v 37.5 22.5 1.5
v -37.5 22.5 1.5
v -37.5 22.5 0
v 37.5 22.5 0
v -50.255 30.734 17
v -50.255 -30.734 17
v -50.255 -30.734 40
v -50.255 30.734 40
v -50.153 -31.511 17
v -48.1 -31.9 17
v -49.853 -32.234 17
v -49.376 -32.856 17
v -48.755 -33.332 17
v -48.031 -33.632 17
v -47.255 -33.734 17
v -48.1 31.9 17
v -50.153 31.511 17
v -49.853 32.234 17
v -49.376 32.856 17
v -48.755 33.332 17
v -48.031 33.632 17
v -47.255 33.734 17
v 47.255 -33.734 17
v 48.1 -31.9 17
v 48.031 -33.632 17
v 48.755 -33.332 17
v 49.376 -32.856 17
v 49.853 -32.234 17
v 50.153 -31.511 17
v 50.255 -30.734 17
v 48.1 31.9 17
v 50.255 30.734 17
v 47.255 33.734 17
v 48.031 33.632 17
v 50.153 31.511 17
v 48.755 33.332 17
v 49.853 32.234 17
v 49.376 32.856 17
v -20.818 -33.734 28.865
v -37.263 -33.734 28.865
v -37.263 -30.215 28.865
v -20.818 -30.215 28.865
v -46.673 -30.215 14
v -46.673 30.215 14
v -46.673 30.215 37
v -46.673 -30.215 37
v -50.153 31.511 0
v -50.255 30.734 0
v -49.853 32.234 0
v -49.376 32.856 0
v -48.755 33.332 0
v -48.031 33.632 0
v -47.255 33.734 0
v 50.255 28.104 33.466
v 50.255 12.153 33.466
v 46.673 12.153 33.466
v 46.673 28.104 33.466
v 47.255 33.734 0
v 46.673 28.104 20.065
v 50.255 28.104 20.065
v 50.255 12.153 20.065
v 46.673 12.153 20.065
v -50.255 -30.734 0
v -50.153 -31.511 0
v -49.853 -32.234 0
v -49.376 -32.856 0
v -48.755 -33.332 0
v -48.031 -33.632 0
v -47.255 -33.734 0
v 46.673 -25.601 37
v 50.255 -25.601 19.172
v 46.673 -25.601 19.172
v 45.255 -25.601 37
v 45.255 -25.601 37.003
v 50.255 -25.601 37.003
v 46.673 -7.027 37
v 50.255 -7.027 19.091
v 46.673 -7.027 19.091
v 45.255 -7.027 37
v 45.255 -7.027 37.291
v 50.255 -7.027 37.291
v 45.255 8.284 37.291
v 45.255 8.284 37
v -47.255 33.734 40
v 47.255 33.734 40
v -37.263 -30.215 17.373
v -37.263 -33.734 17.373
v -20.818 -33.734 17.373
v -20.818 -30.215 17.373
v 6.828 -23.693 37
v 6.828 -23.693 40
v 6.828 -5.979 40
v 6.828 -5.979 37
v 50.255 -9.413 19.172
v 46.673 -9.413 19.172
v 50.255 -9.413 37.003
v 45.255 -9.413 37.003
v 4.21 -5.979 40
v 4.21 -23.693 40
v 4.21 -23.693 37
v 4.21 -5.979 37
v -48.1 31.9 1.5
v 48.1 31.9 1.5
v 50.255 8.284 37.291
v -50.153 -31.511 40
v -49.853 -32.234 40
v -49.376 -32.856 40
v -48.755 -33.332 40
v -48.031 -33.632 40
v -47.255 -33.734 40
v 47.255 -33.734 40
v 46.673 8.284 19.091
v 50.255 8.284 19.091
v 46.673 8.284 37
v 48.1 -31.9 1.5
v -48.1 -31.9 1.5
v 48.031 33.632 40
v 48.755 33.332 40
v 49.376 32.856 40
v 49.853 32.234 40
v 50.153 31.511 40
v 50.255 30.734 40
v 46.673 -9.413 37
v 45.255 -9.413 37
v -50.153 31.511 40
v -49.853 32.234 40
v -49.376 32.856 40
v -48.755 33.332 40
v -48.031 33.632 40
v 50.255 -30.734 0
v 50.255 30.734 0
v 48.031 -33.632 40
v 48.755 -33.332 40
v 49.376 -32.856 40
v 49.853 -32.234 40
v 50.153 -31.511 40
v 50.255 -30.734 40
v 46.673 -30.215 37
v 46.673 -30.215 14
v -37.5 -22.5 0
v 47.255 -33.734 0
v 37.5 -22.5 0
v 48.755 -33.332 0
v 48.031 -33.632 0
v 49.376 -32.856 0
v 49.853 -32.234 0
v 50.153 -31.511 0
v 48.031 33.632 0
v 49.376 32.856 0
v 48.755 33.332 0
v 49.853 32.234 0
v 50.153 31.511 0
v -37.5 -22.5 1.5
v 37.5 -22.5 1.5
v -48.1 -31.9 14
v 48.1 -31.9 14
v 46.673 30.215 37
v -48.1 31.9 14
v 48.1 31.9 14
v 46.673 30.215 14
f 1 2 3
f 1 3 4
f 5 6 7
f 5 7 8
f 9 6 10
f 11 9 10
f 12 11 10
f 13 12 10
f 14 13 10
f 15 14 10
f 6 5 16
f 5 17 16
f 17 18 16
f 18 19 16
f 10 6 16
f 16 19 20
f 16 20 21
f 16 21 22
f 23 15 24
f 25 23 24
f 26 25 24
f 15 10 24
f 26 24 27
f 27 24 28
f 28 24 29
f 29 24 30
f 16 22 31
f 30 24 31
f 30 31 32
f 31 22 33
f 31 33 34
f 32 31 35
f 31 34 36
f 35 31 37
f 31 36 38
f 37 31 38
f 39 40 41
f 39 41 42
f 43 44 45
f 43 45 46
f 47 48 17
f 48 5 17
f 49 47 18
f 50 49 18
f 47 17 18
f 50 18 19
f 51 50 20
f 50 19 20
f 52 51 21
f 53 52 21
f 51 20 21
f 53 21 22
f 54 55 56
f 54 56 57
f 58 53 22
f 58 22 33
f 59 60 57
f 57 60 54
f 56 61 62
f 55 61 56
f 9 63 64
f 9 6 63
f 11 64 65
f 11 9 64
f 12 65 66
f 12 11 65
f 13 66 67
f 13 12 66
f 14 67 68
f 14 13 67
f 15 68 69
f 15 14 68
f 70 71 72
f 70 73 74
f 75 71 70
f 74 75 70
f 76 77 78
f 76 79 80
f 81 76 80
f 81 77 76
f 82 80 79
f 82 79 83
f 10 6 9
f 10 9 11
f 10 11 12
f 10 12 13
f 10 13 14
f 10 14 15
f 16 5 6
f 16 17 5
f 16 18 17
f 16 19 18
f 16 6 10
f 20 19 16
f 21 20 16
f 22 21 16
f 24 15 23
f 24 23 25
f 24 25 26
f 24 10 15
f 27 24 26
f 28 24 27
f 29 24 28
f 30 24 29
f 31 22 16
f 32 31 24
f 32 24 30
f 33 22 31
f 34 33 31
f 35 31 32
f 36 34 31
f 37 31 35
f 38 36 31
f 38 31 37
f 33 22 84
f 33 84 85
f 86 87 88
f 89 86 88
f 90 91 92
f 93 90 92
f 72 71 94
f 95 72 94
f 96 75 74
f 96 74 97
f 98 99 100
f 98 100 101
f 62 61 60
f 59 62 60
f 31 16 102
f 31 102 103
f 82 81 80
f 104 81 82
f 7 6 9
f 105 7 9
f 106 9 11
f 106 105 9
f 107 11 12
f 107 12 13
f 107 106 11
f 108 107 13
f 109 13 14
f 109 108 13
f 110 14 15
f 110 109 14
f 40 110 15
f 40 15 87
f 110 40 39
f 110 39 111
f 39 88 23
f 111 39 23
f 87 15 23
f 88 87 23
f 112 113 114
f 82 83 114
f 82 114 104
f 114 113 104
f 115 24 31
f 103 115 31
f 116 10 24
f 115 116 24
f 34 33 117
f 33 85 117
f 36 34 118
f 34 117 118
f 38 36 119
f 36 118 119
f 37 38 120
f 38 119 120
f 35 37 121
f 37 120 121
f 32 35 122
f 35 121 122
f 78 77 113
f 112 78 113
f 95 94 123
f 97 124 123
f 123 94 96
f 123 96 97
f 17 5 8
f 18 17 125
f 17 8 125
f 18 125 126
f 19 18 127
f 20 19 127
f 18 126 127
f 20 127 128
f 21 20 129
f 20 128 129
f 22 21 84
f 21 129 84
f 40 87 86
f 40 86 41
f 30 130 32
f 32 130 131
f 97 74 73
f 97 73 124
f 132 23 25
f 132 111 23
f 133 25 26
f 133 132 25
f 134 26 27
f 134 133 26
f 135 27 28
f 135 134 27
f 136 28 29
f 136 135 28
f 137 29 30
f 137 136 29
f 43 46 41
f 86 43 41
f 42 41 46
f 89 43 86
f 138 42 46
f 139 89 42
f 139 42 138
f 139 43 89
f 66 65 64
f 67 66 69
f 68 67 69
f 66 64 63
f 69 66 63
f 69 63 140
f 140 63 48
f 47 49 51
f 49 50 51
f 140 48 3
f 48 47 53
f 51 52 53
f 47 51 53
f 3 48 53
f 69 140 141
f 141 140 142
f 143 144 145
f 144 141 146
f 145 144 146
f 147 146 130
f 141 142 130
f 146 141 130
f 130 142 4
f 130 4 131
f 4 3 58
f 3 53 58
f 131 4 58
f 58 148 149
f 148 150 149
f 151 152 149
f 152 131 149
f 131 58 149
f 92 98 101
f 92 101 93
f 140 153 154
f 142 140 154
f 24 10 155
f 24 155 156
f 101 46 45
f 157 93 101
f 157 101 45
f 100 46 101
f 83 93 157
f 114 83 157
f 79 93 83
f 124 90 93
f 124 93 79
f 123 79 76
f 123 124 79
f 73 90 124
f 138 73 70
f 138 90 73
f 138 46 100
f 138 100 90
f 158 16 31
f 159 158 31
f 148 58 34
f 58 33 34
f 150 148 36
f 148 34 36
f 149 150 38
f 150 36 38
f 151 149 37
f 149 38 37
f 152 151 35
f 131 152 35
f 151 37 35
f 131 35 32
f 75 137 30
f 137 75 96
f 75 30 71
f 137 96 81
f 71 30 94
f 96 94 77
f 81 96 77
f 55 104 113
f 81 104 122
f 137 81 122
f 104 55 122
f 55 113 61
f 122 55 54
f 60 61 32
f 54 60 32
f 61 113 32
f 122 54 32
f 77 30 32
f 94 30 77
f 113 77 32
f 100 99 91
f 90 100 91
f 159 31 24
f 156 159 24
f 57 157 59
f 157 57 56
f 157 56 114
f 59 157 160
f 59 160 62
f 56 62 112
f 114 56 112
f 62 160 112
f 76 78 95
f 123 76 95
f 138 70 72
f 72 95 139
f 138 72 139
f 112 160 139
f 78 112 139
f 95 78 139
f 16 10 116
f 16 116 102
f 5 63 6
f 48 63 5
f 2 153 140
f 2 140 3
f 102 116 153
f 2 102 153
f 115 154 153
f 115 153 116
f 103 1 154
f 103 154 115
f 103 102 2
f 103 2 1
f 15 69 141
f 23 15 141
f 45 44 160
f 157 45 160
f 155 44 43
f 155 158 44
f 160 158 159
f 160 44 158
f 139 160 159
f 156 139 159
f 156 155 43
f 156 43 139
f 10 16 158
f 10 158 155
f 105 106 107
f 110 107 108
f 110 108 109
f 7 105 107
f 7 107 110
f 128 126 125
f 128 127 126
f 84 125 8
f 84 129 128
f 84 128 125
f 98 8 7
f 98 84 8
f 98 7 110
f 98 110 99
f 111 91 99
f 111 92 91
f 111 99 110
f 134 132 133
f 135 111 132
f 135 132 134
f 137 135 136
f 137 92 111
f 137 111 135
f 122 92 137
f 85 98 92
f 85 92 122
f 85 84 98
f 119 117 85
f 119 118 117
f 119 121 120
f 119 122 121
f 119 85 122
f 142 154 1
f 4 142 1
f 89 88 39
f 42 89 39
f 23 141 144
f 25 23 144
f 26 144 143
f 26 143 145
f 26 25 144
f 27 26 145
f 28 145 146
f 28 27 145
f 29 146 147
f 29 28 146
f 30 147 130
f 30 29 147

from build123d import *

# Parameters (mm, degrees)
SKETCH_W        = 100.50959
SKETCH_H        = 67.468834
PAD_DEPTH       = 17
SKETCH001_W     = 96.2
SKETCH001_H     = 63.8
POCKET_DEPTH    = 15.5
SKETCH002_W     = 75
SKETCH002_H     = 45
POCKET001_DEPTH = 1.5
FILLET_R        = 3
SKETCH003_W     = 100.50959
SKETCH003_H     = 67.468834
PAD001_DEPTH    = 23
SKETCH004_W     = 96.199996
SKETCH004_H     = 63.8
PAD002_DEPTH    = 3
SKETCH005_W     = 93.345444
SKETCH005_H     = 60.42936
POCKET002_DEPTH = 23
SKETCH006_W     = 16.188404
SKETCH006_H     = 17.830702
SKETCH006_W_2   = 15.311111
SKETCH006_H_2   = 18.199926
SKETCH006_W_3   = 15.951146
SKETCH006_H_3   = 13.401236
POCKET003_DEPTH = 5
SKETCH007_W     = 16.44502
SKETCH007_H     = 11.491716
POCKET004_DEPTH = 5
SKETCH008_W     = 2.618509
SKETCH008_H     = 17.713563
POCKET005_DEPTH = 5
FILLET001_R     = 3


with BuildPart() as body:
    # Sketch → Pad (new body)
    with BuildSketch(Plane.XY):
        Rectangle(SKETCH_W, SKETCH_H)
    extrude(amount=PAD_DEPTH)

    # Sketch001 (on Face6 of Pad) → Pocket (cut)
    with BuildSketch(Plane.XY.offset(17)):
        Rectangle(SKETCH001_W, SKETCH001_H)
    extrude(amount=-POCKET_DEPTH, mode=Mode.SUBTRACT)

    # Sketch002 (on Face11 of Pocket) → Pocket001 (cut)
    with BuildSketch(Plane.XY.offset(1.5)):
        Rectangle(SKETCH002_W, SKETCH002_H)
    extrude(amount=-POCKET001_DEPTH, mode=Mode.SUBTRACT)

    # Fillet
    fillet_edges = [body.edges().sort_by_distance(p)[0] for p in [
        (50.254795, -33.734417, 8.5),
        (50.254795, 33.734417, 8.5),
        (-50.254795, 33.734417, 8.5),
        (-50.254795, -33.734417, 8.5),
    ]]
    fillet(fillet_edges, radius=FILLET_R)


with BuildPart() as body001:
    # Sketch003 (on ShapeBinder) → Pad001 (new body)
    with BuildSketch(Plane.XY.offset(17)):
        Rectangle(SKETCH003_W, SKETCH003_H)
    extrude(amount=PAD001_DEPTH)

    # Sketch004 (on Face5 of Pad001) → Pad002 (join)
    with BuildSketch(Plane(origin=(0, 0, 17), x_dir=(1, 0, 0), z_dir=(0, 0, -1))):
        Rectangle(SKETCH004_W, SKETCH004_H)
    extrude(amount=PAD002_DEPTH)

    # Sketch005 (on Face11 of Pad002) → Pocket002 (cut)
    with BuildSketch(Plane(origin=(0, 0, 14), x_dir=(1, 0, 0), z_dir=(0, 0, -1))):
        Rectangle(SKETCH005_W, SKETCH005_H)
    extrude(amount=-POCKET002_DEPTH, mode=Mode.SUBTRACT)

    # Sketch006 (on Face3 of Pocket002) → Pocket003 (cut)
    with BuildSketch(Plane.YZ.offset(50.254795)):
        with Locations((-17.506884, 28.087621)):
            Rectangle(SKETCH006_W, SKETCH006_H)
        with Locations((0.628194, 28.191151)):
            Rectangle(SKETCH006_W_2, SKETCH006_H_2)
        with Locations((20.128593, 26.765775)):
            Rectangle(SKETCH006_W_3, SKETCH006_H_3)
    extrude(amount=-POCKET003_DEPTH, mode=Mode.SUBTRACT)

    # Sketch007 (on Face6 of Pocket003) → Pocket004 (cut)
    with BuildSketch(Plane.XZ.offset(33.734417)):
        with Locations((-29.040969, 23.119344)):
            Rectangle(SKETCH007_W, SKETCH007_H)
    extrude(amount=-POCKET004_DEPTH, mode=Mode.SUBTRACT)

    # Sketch008 (on Face5 of Pocket004) → Pocket005 (cut)
    with BuildSketch(Plane.XY.offset(40)):
        with Locations((5.519099, -14.836051)):
            Rectangle(SKETCH008_W, SKETCH008_H)
    extrude(amount=-POCKET005_DEPTH, mode=Mode.SUBTRACT)

    # Fillet001
    fillet001_edges = [body001.edges().sort_by_distance(p)[0] for p in [
        (50.254795, 33.734417, 28.5),
        (50.254795, -33.734417, 28.5),
        (-50.254795, -33.734417, 28.5),
        (-50.254795, 33.734417, 28.5),
    ]]
    fillet(fillet001_edges, radius=FILLET001_R)


solid = Compound([body.part, body001.part])
